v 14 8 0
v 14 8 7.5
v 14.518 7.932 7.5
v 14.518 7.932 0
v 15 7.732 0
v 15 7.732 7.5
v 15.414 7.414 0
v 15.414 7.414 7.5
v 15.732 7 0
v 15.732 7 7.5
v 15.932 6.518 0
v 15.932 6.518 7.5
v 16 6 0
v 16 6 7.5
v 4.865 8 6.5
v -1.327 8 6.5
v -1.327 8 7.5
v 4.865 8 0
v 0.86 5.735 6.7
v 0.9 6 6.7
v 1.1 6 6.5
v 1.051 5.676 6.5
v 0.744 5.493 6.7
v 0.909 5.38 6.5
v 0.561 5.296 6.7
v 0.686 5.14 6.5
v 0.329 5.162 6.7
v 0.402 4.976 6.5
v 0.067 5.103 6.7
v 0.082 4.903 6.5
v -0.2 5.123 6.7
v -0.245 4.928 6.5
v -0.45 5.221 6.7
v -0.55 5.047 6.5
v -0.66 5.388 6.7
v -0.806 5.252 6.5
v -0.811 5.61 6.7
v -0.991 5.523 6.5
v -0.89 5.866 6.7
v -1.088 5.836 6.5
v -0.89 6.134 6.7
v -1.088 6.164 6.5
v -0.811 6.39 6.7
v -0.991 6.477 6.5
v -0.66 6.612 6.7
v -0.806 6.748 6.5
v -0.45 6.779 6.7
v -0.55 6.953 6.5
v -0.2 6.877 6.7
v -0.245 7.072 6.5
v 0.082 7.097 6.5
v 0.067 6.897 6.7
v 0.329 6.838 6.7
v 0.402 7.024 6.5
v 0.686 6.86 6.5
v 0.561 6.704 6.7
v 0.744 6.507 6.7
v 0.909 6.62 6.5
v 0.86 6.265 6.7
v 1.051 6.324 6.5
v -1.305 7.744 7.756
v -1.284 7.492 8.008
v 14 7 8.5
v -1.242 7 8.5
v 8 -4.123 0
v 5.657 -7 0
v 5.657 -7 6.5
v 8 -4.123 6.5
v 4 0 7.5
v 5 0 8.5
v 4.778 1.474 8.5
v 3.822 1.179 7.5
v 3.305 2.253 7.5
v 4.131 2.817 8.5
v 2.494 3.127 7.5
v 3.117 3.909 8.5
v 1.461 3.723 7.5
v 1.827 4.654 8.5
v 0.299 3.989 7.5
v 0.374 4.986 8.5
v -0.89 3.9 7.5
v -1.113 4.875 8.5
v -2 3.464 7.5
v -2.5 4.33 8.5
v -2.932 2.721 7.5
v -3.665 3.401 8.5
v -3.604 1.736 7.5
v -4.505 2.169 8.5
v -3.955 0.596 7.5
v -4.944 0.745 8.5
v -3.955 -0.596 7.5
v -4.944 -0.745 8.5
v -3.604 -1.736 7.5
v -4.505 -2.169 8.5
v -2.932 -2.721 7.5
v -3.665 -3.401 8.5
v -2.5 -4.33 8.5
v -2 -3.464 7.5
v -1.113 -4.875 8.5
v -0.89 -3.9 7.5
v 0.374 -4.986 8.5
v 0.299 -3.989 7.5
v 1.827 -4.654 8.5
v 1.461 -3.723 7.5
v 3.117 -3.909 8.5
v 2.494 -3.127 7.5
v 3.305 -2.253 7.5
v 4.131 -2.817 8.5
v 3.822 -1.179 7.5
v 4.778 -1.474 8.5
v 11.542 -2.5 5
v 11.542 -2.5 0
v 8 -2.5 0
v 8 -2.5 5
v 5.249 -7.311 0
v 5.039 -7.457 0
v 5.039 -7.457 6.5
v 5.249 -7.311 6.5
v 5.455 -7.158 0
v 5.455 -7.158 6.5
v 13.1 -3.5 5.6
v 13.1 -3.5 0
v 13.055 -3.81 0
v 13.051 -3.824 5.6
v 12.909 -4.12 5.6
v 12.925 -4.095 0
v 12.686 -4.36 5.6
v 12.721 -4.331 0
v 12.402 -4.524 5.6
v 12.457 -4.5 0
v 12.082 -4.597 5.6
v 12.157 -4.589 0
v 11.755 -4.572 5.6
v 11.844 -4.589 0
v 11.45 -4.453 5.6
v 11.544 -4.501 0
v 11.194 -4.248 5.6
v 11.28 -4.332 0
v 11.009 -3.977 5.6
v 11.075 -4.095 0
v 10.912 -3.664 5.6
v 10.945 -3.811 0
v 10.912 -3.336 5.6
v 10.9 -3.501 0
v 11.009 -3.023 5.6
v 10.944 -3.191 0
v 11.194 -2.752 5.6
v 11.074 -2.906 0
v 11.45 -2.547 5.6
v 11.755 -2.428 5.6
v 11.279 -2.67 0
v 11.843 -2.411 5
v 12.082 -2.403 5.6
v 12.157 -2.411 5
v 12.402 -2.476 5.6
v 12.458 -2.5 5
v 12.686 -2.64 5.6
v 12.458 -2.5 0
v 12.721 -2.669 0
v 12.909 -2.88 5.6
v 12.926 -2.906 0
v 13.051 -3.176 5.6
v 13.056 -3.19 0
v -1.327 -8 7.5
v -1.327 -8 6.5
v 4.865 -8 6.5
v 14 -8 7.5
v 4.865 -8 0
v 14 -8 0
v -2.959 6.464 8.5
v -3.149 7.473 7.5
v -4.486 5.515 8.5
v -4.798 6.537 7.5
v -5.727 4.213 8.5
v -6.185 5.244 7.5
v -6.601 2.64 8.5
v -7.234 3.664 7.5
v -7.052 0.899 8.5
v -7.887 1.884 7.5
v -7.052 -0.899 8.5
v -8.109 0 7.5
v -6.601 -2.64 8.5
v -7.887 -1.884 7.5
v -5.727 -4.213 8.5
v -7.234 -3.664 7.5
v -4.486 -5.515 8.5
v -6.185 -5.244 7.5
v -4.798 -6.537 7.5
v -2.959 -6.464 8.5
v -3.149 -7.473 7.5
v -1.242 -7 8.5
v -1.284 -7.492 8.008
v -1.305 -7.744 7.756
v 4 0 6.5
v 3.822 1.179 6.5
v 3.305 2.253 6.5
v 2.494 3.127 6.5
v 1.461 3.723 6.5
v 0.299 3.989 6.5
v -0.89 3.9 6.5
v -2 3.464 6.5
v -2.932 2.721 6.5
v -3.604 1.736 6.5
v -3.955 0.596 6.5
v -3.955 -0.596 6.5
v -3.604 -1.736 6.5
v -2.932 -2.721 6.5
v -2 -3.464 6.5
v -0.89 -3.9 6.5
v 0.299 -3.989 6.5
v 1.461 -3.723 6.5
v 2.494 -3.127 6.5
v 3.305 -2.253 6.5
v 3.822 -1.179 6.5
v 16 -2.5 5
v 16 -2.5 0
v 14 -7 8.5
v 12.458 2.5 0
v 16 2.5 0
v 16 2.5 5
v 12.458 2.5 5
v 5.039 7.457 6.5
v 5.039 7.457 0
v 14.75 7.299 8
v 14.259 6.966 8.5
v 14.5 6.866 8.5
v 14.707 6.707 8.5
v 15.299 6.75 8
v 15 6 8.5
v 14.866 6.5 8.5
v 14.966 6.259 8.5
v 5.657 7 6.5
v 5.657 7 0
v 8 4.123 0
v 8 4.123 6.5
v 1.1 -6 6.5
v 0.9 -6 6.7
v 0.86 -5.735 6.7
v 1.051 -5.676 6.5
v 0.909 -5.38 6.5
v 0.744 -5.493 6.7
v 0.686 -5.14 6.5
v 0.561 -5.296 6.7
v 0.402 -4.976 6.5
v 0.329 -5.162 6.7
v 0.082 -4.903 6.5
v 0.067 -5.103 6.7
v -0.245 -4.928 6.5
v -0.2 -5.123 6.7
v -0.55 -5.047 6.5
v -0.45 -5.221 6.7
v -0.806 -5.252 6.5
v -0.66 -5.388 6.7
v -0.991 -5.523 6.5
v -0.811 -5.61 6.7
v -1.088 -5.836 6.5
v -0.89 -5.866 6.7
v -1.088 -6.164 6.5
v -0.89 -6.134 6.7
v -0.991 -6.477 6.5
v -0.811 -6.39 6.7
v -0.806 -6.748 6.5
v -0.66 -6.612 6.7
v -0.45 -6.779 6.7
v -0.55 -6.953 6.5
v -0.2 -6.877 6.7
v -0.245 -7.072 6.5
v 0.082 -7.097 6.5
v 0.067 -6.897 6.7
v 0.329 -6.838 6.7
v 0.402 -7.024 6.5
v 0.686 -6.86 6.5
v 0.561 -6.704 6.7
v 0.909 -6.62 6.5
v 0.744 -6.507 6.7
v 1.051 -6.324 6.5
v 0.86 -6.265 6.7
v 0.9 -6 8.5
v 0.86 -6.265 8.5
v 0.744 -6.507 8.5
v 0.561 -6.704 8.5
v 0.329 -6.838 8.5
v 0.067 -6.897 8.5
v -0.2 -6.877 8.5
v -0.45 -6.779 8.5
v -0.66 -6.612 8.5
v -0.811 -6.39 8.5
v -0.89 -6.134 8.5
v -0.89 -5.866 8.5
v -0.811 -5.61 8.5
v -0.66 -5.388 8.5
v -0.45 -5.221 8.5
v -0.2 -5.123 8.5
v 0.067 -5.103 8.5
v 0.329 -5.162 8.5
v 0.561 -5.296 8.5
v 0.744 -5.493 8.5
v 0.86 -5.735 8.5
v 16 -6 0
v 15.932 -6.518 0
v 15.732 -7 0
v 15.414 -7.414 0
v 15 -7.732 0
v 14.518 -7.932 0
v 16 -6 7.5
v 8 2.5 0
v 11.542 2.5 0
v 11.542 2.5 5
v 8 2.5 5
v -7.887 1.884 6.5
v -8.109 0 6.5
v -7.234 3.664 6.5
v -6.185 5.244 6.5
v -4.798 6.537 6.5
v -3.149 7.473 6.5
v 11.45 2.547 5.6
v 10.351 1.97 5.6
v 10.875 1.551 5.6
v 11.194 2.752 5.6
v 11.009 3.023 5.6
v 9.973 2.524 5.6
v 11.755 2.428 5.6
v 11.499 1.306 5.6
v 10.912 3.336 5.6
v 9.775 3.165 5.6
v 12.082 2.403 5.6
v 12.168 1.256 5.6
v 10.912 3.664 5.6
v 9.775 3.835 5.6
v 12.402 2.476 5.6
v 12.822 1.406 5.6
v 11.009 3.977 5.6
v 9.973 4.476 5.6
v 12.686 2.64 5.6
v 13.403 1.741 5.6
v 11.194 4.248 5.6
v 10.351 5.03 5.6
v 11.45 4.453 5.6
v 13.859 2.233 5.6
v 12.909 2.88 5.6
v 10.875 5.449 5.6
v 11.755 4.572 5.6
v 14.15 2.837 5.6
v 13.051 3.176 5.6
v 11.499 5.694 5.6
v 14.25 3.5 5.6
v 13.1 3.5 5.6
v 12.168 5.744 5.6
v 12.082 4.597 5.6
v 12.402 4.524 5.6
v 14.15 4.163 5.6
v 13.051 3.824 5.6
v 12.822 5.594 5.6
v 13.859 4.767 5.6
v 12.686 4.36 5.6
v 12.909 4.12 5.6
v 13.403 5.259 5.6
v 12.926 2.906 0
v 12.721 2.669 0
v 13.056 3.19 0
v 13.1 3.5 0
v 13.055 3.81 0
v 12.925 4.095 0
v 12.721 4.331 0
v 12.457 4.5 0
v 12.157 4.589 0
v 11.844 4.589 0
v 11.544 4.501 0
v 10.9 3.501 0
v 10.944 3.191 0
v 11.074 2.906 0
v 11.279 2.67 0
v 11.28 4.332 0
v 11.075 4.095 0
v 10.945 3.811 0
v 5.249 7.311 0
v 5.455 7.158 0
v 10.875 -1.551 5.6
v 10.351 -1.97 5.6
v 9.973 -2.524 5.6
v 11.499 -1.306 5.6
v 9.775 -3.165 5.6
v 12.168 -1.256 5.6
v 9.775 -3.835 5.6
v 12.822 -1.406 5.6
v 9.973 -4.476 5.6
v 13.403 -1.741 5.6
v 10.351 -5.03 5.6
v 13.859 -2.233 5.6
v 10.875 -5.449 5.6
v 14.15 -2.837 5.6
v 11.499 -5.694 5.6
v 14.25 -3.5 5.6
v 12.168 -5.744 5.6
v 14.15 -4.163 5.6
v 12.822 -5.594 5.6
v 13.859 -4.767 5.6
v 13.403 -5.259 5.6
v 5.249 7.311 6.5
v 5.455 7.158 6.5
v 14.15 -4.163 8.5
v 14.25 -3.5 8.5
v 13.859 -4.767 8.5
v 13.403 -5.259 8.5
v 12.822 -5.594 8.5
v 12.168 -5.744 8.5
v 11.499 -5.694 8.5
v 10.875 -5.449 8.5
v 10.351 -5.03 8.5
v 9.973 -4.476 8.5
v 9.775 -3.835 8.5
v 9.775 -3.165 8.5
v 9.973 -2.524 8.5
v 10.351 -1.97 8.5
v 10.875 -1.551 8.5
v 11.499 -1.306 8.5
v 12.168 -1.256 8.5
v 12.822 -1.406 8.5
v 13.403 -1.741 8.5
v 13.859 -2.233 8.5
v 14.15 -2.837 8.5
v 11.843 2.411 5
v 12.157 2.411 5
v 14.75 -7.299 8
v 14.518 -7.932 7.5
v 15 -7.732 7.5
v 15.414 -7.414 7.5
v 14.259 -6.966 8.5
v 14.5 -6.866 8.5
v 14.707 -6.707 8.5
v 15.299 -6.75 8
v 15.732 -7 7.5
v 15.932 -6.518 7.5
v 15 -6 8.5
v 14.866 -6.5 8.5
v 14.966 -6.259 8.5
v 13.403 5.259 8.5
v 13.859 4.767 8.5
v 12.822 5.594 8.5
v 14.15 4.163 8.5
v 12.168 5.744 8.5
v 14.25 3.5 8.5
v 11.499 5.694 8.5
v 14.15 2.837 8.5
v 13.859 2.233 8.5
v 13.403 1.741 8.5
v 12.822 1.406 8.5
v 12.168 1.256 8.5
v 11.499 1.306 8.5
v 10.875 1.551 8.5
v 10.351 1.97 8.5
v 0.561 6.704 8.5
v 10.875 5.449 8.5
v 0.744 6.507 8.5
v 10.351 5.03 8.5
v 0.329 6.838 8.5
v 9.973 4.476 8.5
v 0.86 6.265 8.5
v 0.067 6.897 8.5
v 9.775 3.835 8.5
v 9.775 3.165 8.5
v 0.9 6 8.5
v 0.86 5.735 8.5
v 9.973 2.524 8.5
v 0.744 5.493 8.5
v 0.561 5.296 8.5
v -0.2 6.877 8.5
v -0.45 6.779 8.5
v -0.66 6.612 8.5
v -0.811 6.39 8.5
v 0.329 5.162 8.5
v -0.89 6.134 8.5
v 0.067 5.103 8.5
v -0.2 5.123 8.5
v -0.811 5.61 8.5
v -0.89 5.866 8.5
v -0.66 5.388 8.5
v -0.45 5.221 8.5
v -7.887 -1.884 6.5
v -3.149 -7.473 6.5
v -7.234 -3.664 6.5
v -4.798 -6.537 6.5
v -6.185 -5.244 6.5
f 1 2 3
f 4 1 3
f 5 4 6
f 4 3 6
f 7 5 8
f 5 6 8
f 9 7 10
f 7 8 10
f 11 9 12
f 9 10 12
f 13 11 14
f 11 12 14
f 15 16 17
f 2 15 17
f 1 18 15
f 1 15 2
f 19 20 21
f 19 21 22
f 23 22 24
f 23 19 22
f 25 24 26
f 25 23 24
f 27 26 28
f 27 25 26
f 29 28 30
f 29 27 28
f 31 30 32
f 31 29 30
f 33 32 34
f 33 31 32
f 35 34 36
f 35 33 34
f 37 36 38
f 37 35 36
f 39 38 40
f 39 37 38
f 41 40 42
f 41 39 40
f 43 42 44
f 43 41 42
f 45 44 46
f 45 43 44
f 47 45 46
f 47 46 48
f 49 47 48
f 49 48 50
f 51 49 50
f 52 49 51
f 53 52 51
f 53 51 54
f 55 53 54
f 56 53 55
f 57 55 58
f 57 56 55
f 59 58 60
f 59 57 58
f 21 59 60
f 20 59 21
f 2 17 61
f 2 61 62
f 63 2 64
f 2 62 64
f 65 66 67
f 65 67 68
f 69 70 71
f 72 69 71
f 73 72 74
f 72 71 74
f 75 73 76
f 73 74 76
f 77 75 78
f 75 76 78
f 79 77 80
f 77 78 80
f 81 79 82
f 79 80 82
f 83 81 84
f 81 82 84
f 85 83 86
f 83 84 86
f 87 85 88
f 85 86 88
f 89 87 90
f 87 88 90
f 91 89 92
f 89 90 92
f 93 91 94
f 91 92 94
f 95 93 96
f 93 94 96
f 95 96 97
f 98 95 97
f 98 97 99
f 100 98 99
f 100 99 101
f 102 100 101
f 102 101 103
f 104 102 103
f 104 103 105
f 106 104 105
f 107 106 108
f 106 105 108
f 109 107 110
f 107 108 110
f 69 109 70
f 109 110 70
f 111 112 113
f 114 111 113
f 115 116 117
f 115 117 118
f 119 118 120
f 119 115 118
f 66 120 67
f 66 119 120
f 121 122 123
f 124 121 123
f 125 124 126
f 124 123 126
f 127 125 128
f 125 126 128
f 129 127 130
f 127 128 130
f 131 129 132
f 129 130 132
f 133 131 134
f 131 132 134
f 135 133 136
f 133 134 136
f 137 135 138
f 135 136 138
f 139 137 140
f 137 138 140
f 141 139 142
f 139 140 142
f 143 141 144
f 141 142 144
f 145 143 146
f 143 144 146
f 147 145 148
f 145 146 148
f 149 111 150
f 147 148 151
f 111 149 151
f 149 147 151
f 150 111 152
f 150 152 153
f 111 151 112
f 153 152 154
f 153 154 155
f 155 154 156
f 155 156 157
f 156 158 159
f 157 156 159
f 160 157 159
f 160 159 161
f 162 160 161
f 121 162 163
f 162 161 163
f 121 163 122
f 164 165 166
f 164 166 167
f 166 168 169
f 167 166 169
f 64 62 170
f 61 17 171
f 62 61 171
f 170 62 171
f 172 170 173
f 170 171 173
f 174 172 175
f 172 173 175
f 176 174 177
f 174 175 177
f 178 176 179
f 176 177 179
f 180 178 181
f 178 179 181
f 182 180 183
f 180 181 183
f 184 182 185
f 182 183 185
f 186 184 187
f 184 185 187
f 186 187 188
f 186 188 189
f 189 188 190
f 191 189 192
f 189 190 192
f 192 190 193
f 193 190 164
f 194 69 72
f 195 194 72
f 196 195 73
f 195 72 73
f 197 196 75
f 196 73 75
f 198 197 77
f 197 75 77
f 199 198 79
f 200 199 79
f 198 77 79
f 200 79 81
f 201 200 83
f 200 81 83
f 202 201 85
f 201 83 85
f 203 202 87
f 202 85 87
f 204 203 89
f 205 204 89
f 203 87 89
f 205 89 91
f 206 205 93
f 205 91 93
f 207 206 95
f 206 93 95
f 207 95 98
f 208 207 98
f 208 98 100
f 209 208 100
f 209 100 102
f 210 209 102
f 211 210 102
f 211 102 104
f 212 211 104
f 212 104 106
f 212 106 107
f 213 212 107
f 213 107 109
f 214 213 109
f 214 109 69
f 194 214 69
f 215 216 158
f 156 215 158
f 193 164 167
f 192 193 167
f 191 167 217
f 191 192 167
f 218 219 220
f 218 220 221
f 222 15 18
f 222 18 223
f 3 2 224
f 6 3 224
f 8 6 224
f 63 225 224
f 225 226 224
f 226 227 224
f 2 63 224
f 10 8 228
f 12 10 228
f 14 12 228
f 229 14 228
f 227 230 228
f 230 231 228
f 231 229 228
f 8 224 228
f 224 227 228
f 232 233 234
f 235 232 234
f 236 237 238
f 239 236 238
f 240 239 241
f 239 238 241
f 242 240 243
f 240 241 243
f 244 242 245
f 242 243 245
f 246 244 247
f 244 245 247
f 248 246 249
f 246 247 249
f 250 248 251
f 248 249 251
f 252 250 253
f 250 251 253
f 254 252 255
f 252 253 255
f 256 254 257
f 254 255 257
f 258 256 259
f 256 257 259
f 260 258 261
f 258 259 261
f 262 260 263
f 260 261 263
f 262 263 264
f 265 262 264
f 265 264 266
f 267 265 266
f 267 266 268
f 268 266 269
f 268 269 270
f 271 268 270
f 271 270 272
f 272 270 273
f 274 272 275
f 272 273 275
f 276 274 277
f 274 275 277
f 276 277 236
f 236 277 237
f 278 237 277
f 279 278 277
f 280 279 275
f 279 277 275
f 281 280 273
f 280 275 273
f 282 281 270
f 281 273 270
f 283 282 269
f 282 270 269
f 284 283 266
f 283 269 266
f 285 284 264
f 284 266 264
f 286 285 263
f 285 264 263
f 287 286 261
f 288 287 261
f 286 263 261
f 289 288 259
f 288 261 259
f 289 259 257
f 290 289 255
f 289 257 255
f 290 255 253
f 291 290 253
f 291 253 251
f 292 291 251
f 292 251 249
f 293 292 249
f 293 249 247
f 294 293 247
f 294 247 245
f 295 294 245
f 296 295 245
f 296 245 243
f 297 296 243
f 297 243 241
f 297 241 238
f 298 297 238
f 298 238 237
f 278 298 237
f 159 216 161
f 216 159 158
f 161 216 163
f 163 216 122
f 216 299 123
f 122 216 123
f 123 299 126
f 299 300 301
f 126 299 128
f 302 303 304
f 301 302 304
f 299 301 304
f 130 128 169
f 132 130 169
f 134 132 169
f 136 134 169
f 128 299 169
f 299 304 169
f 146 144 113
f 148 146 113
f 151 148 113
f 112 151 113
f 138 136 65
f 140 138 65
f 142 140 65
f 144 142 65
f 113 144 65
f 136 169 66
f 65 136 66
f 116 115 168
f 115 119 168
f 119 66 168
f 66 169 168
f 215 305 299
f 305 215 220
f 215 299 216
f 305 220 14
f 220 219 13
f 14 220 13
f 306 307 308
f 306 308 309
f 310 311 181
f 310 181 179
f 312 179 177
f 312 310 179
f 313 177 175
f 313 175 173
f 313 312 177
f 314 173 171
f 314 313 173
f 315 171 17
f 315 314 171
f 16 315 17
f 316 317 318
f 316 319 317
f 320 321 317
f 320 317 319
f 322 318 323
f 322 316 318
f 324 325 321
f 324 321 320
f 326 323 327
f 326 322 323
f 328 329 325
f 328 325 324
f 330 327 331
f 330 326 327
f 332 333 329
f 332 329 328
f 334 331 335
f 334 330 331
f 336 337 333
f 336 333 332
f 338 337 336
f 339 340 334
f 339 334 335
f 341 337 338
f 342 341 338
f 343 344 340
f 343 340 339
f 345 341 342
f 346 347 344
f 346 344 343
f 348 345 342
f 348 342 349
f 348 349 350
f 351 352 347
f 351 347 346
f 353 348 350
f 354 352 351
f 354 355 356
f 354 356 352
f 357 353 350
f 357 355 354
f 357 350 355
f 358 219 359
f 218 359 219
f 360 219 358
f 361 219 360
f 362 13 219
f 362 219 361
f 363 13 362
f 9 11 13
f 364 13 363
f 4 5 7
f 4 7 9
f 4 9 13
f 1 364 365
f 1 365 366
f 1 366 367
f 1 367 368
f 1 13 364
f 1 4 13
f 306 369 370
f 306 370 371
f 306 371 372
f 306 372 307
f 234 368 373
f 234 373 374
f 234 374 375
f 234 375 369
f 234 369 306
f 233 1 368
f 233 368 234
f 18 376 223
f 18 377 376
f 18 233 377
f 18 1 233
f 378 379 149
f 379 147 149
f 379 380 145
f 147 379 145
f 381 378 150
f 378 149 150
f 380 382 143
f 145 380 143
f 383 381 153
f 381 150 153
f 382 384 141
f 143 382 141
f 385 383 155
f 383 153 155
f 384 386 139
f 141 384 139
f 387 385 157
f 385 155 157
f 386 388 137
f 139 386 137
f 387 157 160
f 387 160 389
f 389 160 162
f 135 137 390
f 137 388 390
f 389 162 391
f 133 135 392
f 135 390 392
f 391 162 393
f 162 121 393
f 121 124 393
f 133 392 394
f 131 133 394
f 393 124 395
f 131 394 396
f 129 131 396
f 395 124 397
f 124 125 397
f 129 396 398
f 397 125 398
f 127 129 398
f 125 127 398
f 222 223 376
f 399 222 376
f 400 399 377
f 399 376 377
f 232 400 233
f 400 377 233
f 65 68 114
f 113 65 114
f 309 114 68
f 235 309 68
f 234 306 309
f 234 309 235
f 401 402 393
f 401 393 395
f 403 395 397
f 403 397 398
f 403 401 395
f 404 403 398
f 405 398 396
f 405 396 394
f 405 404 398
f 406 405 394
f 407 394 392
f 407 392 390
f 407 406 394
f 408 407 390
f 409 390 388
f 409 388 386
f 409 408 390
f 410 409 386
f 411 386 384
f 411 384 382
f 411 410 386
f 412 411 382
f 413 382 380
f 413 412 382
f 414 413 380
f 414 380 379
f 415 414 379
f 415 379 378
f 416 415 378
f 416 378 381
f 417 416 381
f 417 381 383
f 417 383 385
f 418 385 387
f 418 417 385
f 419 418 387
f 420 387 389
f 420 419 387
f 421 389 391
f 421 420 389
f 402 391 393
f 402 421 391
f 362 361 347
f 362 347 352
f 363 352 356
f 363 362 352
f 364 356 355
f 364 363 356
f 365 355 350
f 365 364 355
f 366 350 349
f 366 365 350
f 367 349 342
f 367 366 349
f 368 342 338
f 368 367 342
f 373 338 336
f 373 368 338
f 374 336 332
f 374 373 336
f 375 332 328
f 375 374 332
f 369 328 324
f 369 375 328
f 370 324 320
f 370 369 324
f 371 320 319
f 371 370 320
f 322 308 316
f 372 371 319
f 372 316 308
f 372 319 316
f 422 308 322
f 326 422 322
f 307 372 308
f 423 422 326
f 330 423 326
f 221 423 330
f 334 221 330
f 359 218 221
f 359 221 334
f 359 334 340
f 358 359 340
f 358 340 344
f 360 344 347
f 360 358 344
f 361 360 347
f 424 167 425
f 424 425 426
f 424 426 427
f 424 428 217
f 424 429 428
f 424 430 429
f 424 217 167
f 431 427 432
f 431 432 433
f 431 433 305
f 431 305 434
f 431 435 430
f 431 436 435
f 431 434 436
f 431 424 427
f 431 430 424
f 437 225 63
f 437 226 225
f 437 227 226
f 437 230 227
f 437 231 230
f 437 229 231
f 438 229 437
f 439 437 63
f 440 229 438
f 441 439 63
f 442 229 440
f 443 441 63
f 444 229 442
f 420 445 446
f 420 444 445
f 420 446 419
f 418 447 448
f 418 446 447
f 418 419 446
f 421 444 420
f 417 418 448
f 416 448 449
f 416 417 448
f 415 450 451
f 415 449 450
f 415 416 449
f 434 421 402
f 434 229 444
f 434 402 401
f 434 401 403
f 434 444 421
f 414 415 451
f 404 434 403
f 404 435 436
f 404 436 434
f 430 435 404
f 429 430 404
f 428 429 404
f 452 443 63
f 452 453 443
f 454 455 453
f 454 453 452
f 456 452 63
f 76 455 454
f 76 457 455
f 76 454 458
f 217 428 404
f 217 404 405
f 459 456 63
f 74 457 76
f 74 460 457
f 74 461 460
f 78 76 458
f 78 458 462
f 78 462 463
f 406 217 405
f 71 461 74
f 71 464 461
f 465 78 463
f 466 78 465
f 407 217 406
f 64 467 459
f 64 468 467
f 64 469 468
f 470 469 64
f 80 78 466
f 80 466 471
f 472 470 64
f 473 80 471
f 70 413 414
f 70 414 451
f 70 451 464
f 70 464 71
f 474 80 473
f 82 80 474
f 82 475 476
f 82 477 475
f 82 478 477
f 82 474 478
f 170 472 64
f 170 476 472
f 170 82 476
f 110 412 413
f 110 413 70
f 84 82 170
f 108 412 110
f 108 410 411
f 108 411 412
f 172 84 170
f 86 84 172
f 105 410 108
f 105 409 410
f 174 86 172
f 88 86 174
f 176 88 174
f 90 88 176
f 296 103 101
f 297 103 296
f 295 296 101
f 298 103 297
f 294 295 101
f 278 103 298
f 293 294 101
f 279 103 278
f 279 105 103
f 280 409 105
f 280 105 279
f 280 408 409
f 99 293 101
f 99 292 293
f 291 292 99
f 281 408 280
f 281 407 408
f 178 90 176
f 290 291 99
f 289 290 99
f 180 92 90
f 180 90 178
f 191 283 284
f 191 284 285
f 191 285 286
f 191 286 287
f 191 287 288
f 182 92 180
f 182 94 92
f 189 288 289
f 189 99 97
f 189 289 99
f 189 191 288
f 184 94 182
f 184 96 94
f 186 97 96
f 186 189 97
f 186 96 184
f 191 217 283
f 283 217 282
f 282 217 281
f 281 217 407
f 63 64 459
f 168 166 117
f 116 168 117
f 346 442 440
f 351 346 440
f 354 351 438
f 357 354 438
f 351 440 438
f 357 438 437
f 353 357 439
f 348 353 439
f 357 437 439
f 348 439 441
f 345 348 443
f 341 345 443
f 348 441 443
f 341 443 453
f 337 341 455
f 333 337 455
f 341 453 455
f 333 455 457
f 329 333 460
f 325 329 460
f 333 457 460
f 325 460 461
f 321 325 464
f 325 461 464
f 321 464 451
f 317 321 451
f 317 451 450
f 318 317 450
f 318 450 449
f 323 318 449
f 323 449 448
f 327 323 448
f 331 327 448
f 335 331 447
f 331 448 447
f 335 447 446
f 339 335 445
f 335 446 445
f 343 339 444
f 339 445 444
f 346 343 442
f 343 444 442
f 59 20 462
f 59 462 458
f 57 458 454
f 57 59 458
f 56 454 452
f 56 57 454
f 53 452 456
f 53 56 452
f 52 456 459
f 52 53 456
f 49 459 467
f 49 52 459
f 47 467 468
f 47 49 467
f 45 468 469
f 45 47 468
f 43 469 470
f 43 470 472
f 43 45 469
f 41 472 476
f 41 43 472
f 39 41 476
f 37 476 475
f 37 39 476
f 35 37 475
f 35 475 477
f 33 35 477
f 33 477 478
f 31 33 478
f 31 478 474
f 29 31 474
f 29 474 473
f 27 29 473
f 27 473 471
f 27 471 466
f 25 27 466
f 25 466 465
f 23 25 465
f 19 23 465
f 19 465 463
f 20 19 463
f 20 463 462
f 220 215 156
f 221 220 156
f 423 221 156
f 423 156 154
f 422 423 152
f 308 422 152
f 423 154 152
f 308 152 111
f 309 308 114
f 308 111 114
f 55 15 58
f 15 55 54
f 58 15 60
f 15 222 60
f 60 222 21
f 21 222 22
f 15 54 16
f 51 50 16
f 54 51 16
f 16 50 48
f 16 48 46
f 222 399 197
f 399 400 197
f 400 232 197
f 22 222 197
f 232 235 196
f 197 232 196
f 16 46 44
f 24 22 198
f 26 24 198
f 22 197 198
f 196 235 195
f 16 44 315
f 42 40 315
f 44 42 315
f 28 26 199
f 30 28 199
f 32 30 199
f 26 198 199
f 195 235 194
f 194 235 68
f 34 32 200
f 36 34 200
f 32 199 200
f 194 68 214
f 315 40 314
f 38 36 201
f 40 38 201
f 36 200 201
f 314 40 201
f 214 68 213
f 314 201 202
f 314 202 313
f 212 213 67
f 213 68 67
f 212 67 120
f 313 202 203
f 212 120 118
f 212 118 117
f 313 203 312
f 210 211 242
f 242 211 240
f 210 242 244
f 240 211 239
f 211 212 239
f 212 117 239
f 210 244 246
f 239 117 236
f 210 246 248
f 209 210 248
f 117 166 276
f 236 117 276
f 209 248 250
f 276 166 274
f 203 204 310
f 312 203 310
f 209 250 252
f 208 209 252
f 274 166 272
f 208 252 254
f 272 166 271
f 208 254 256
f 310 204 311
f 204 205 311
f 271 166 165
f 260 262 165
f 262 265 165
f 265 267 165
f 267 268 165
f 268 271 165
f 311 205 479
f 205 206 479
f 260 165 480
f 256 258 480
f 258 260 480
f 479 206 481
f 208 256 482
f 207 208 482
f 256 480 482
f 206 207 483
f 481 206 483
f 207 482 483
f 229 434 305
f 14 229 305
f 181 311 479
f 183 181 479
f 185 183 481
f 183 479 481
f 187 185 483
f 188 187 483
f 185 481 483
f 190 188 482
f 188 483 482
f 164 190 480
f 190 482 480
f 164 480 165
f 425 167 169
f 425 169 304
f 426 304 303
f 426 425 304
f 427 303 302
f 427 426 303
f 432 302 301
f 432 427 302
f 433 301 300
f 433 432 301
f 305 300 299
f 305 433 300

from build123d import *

# Parameters (mm, degrees)
CROQUIS1_R              = 0.9
CROQUIS1_R_2            = 1.1
SALIENTE_EXTRUIR1_DEPTH = 8.5
REDONDEO1_R             = 2
CORTAR_EXTRUIR6_DEPTH   = 6.5
CHAFL_N1_SIZE           = 1
CHAFL_N1_SIZE_2         = 0.742384029
CROQUIS5_W              = 8
CROQUIS5_H              = 2.5
CORTAR_EXTRUIR7_DEPTH   = 5
CROQUIS6_R              = 2.25
CORTAR_EXTRUIR8_DEPTH   = 2.9
CHAFL_N3_SIZE           = 0.2
CROQUIS7_R              = 4
CORTAR_EXTRUIR9_DEPTH   = 20.80530232
CHAFL_N2_SIZE           = 1


with BuildPart() as part:
    # Croquis1 → Saliente-Extruir1 (new body)
    with BuildSketch(Plane.XY):
        with BuildLine():
            Line((-1.326649916, 8), (16, 8))
            Line((16, 8), (16, 0))
            Line((16, 0), (8, 0))
            Line((8, 0), (-8.109253973, 0))
            ThreePointArc((-8.109253973, 0), (-6.185391706, 5.24413286), (-1.326649916, 8))
        make_face()
        with Locations((0, 6)):
            Circle(CROQUIS1_R, mode=Mode.SUBTRACT)
        with Locations((12, 3.5)):
            Circle(CROQUIS1_R_2, mode=Mode.SUBTRACT)
    extrude(amount=SALIENTE_EXTRUIR1_DEPTH)

    # Redondeo1
    redondeo1_edges = [part.edges().sort_by_distance(p)[0] for p in [
        (16, 8, 4.25),
    ]]
    fillet(redondeo1_edges, radius=REDONDEO1_R)

    # Croquis4 → Cortar-Extruir6 (cut)
    with BuildSketch(Plane(origin=(0, 0, 0), x_dir=(-1, 0, 0), z_dir=(0, 0, -1))):
        with BuildLine():
            Line((-5.656854249, 7), (-8, 4.123105626))
            Line((-8, 4.123105626), (-8, 0))
            Line((-8, 0), (8.109253973, 0))
            Line((8.109253973, 0), (9, 0))
            ThreePointArc((9, 0), (3.878679656, 8.121320344), (-5.656854249, 7))
        make_face()
    extrude(amount=-CORTAR_EXTRUIR6_DEPTH, mode=Mode.SUBTRACT)

    # Chaflán1
    # the kernel refuses this chamfer: 1, 0.742384029 mm, written as the material it takes off along each edge
    with BuildSketch(Plane(origin=(16, 6, 8.5), x_dir=(-1, 0, 0), z_dir=(0, -1, 0))) as chafl_n1_piece_1:
        Polygon((CHAFL_N1_SIZE, 0), (0, CHAFL_N1_SIZE), (0, 0), align=None)
    extrude(amount=8.571682988, mode=Mode.SUBTRACT)
    with BuildSketch(Plane(origin=(-5.698510996, 8, 8.5), x_dir=(0, 0, -1), z_dir=(1, 0, 0))) as chafl_n1_piece_2:
        Polygon((CHAFL_N1_SIZE, 0), (0, -CHAFL_N1_SIZE), (0, 0), align=None)
    extrude(amount=19.698510996, mode=Mode.SUBTRACT)
    with BuildSketch(Plane(origin=(14, 6, 8.5), x_dir=(0, 1, 0), z_dir=(-1, 0, 0))) as chafl_n1_piece_3:
        Polygon((2, CHAFL_N1_SIZE), (2 - CHAFL_N1_SIZE, 0), (2, 0), align=None)
    revolve(axis=Axis((14, 6, 8.5), (0, 0, -1)), revolution_arc=90, mode=Mode.SUBTRACT)
    with BuildSketch(Plane(origin=(0, 0, 8.5), x_dir=(-0.9501026430594787, -0.3119374418876211, 0), z_dir=(0.3119374418876211, -0.9501026430594787, 0))) as chafl_n1_piece_4:
        Polygon((8.109253973 - CHAFL_N1_SIZE, 0), (8.109253973, CHAFL_N1_SIZE), (8.109253973, 0), align=None)
    revolve(axis=Axis((0, 0, 8.5), (0, 0, -1)), revolution_arc=116.936314038, mode=Mode.SUBTRACT)
    with BuildSketch(Plane(origin=(4.123105626, 8, 6.5), x_dir=(1, 0, 0), z_dir=(0, 0, -1))) as chafl_n1_piece_5:
        with BuildLine():
            Line((CHAFL_N1_SIZE_2, 0), (0.916025454, 0.542979283))
            ThreePointArc((0.916025454, 0.542979283), (0.478949419, 0.265590562), (0, 0))
            Line((0, 0), (CHAFL_N1_SIZE_2, 0))
        make_face()
    extrude(amount=9.23772815, mode=Mode.SUBTRACT)

    # Croquis5 → Cortar-Extruir7 (cut)
    with BuildSketch(Plane(origin=(0, 0, 0), x_dir=(-1, 0, 0), z_dir=(0, 0, -1))):
        with Locations((-12, 1.25)):
            Rectangle(CROQUIS5_W, CROQUIS5_H)
    extrude(amount=-CORTAR_EXTRUIR7_DEPTH, mode=Mode.SUBTRACT)

    # Croquis6 → Cortar-Extruir8 (cut)
    with BuildSketch(Plane.XY.offset(8.5)):
        with Locations((12, 3.5)):
            Circle(CROQUIS6_R)
    extrude(amount=-CORTAR_EXTRUIR8_DEPTH, mode=Mode.SUBTRACT)

    # Chaflán3
    chafl_n3_edges = [part.edges().sort_by_distance(p)[0] for p in [
        (-0.9, 6, 6.5),
    ]]
    chamfer(chafl_n3_edges, length=CHAFL_N3_SIZE)

    # Simetría1: part across plane


with BuildPart() as part_1:
    add(part.part)
    add(part.part.mirror(Plane(origin=(16, 0, 8.5), x_dir=(0, 0, 1), z_dir=(0, 1, 0))))

    # Croquis7 → Cortar-Extruir9 (cut, through all)
    with BuildSketch(Plane.XY.offset(8.5)):
        Circle(CROQUIS7_R)
    extrude(amount=-CORTAR_EXTRUIR9_DEPTH, mode=Mode.SUBTRACT)

    # Chaflán2
    chafl_n2_edges = [part_1.edges().sort_by_distance(p)[0] for p in [
        (-4, 0, 8.5),
    ]]
    chamfer(chafl_n2_edges, length=CHAFL_N2_SIZE)


solid = part_1.part
